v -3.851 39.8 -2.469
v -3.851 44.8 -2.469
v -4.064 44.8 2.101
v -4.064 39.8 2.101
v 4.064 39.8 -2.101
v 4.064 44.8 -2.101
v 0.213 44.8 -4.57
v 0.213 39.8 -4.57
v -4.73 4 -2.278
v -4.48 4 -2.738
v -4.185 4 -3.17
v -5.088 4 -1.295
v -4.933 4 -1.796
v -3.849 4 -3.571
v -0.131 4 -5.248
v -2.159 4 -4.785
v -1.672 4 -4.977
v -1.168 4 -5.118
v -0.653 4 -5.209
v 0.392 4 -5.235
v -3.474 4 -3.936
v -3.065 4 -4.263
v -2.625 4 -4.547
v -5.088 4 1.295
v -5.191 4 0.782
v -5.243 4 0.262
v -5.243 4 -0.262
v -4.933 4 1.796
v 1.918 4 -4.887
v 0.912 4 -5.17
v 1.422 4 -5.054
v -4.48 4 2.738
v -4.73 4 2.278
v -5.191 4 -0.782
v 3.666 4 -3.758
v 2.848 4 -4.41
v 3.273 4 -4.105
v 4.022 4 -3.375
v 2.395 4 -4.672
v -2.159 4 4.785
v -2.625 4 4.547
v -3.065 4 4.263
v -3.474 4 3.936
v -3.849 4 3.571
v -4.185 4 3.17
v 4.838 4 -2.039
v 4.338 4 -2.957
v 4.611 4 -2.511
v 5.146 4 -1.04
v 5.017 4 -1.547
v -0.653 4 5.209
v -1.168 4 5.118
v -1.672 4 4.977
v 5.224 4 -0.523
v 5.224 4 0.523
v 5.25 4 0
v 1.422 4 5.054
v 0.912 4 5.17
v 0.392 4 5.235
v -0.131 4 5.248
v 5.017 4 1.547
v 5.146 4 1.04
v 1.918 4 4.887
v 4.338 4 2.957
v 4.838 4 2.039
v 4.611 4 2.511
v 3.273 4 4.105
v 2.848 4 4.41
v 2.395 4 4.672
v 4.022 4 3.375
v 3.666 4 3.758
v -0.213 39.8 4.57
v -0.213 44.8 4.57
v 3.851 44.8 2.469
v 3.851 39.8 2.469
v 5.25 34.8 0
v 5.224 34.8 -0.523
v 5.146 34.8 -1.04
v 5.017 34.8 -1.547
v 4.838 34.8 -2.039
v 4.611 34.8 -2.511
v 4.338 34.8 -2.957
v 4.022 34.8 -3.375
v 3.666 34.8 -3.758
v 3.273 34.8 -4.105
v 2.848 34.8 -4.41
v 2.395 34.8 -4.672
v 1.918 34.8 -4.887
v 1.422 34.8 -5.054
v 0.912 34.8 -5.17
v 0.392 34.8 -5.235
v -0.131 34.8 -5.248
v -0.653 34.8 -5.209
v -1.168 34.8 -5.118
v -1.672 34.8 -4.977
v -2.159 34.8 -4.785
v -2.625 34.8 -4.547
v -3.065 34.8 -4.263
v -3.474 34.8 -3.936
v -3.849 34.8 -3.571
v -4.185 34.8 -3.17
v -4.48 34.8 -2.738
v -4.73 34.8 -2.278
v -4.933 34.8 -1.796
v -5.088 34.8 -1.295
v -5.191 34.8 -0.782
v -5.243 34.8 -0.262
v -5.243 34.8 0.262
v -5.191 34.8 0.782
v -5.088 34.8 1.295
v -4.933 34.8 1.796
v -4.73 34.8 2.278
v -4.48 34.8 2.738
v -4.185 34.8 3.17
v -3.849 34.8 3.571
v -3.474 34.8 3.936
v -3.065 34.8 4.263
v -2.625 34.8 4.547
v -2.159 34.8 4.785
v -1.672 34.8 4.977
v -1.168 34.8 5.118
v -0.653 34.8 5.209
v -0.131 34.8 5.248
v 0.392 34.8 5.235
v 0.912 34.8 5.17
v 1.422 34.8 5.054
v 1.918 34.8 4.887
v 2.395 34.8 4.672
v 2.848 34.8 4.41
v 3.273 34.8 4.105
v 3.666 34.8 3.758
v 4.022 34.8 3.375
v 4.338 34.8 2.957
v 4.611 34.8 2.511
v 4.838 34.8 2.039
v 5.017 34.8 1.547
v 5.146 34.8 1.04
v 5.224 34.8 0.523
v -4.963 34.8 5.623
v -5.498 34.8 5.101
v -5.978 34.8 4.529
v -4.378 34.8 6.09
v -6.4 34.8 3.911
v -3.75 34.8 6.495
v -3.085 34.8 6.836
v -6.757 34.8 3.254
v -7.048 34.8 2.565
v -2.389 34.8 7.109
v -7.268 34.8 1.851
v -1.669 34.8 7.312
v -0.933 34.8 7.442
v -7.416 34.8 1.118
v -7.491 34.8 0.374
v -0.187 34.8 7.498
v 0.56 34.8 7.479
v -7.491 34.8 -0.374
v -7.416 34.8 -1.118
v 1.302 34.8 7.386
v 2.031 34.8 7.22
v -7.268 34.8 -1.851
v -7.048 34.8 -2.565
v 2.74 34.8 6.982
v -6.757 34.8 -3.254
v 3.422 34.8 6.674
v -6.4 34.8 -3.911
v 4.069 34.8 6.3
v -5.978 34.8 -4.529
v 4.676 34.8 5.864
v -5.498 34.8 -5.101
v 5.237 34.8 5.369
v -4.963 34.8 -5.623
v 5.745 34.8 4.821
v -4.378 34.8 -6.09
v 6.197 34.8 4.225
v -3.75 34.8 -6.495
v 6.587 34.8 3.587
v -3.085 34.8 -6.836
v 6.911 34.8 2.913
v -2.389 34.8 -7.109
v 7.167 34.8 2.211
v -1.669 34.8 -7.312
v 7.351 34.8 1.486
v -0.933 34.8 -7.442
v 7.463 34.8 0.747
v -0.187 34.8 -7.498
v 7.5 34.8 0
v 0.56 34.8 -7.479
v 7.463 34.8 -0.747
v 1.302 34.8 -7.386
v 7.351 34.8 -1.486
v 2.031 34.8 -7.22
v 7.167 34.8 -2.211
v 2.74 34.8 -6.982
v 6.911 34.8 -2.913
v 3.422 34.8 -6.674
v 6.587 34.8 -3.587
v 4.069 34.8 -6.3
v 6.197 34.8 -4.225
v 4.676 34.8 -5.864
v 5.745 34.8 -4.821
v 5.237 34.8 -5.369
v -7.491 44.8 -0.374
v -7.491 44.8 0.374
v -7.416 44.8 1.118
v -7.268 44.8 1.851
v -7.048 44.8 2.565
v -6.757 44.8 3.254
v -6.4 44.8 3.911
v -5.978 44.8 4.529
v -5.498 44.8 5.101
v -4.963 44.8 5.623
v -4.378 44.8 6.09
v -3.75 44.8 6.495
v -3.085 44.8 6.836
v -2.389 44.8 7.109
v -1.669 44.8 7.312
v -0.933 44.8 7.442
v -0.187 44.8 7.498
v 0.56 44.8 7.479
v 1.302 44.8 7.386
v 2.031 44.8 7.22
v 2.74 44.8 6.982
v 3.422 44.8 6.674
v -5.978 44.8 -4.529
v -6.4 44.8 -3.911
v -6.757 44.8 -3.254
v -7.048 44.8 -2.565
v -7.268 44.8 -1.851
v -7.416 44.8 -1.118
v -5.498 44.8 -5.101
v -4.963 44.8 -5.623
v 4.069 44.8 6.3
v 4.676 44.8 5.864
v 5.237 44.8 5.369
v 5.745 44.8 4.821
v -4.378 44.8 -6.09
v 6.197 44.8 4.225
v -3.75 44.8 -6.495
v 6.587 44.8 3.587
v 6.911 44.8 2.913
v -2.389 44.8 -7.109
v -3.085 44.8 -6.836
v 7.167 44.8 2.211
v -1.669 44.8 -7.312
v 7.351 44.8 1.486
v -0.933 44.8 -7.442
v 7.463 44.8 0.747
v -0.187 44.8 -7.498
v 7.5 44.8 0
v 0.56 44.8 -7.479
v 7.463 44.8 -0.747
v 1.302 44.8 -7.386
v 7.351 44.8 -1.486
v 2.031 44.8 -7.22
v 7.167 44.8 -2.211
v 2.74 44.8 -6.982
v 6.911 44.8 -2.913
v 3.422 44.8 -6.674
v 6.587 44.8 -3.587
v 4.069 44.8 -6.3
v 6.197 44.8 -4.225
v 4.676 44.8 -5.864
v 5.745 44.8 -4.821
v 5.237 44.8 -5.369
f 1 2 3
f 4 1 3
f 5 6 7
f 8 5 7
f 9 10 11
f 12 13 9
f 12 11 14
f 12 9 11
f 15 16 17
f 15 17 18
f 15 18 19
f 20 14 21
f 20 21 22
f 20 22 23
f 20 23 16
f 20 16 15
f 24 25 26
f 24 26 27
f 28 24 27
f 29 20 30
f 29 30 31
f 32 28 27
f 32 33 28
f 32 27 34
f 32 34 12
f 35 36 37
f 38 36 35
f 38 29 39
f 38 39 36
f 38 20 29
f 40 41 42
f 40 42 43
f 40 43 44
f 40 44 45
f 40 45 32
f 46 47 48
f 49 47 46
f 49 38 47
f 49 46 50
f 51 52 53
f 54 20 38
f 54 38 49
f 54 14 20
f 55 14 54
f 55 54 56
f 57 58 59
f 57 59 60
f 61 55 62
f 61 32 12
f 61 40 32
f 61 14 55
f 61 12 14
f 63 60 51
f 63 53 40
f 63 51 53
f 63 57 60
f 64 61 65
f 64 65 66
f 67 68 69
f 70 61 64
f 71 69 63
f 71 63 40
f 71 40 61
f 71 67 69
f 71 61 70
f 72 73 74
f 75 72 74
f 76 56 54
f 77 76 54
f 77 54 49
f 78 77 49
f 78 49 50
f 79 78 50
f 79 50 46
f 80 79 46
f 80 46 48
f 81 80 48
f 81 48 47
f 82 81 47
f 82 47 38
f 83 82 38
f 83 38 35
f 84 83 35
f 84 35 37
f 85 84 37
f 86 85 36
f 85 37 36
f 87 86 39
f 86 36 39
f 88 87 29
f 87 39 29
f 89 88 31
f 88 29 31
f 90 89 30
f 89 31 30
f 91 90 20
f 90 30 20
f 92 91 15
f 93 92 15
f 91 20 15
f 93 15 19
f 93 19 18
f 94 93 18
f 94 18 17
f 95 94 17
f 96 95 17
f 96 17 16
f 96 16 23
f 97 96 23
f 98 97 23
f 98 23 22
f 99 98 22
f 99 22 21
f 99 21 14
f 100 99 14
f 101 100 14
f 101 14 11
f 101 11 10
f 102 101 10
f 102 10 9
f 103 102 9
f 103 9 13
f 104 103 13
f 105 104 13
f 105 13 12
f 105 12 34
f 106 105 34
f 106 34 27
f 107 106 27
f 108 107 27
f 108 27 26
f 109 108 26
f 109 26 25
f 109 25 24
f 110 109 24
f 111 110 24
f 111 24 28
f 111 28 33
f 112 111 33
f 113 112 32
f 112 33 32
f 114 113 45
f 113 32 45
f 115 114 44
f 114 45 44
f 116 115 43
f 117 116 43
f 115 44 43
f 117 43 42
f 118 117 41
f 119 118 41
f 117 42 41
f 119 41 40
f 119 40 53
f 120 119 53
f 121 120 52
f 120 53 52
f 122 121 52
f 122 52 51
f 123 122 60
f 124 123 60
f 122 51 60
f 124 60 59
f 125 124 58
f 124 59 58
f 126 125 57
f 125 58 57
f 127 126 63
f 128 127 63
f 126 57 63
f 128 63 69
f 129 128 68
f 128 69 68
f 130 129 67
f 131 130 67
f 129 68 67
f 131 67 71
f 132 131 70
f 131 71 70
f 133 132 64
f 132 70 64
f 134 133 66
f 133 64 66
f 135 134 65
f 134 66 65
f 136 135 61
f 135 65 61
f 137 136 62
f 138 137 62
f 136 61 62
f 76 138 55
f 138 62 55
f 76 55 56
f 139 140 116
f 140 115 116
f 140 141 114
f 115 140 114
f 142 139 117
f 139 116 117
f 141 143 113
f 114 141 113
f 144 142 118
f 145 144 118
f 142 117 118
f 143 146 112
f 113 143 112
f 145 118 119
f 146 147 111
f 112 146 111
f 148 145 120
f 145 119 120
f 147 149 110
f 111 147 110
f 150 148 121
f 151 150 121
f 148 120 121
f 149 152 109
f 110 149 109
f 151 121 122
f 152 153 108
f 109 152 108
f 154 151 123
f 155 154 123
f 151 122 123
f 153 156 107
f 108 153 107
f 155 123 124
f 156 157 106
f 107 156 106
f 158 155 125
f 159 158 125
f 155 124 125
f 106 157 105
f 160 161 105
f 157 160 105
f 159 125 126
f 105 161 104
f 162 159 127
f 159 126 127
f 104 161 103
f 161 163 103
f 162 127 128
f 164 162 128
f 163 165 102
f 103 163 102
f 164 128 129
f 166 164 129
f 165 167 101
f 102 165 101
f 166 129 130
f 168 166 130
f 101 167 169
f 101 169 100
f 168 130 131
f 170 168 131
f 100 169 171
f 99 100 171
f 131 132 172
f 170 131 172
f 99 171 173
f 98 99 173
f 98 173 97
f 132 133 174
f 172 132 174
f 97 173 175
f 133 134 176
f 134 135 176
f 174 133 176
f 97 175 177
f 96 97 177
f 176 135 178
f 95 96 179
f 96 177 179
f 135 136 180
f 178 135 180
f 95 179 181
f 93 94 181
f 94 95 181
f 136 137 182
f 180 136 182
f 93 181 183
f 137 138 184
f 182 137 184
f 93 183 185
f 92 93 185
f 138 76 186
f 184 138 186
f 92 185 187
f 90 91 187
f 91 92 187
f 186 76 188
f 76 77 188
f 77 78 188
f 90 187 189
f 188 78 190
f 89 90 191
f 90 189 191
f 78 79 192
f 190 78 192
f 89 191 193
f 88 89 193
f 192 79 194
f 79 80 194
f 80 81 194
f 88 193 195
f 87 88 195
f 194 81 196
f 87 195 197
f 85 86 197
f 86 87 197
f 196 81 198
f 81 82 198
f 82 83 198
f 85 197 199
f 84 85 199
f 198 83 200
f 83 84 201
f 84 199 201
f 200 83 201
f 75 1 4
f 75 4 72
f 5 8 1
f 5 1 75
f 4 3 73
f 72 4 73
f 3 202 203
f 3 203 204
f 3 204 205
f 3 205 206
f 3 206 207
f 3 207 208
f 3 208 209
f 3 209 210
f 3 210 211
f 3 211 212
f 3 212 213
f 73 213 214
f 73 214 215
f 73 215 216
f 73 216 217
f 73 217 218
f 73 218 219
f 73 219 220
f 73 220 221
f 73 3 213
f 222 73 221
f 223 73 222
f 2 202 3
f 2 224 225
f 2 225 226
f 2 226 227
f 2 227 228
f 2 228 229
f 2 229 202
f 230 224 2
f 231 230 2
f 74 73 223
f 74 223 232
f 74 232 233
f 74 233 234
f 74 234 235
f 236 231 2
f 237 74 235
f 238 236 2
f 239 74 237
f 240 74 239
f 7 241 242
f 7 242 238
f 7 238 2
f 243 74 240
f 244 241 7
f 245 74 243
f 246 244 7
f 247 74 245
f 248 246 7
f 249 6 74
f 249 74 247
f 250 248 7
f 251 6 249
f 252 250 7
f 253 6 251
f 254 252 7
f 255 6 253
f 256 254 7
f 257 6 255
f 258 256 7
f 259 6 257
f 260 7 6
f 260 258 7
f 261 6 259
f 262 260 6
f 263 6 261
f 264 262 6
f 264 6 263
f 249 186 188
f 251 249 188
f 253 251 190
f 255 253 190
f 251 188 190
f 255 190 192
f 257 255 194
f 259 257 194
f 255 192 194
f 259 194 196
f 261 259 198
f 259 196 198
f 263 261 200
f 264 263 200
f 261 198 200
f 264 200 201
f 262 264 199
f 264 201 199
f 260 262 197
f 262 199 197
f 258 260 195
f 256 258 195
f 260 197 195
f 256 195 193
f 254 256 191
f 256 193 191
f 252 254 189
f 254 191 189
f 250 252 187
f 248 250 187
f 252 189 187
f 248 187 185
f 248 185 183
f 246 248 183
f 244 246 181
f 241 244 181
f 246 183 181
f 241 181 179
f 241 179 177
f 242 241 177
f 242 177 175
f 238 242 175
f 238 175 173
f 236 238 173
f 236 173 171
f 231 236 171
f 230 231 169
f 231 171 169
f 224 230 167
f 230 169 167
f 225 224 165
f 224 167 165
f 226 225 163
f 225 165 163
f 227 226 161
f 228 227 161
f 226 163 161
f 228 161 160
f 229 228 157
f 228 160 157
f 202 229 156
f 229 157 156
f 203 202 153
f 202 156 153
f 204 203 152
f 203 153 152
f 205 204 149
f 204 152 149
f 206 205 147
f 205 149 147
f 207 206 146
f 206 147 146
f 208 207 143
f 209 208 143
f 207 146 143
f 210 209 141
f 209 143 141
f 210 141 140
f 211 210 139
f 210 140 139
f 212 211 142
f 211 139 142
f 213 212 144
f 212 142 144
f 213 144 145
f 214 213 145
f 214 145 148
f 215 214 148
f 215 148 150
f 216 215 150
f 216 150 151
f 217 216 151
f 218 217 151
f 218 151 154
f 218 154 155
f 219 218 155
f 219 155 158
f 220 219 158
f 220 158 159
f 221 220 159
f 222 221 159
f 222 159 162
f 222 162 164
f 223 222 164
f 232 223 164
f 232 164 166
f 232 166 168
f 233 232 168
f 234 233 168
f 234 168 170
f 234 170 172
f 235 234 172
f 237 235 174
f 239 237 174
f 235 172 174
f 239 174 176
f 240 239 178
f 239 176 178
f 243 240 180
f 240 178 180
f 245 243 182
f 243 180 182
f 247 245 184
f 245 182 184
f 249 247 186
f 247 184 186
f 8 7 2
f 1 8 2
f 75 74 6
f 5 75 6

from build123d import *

# Parameters (mm, degrees)
ESBO_O1_R                = 5.25
RESSALTO_EXTRUS_O1_DEPTH = 34.8
ESBO_O2_R                = 7.5
RESSALTO_EXTRUS_O2_DEPTH = 10
CORTE_EXTRUS_O1_DEPTH    = 5
ESBO_O4_R                = 5.25
CORTE_EXTRUS_O2_DEPTH    = 4


with BuildPart() as part:
    # Esboço1 → Ressalto-extrusão1 (new body)
    with BuildSketch(Plane(origin=(0, 0, 0), x_dir=(1, 0, 0), z_dir=(0, 1, 0))):
        Circle(ESBO_O1_R)
    extrude(amount=RESSALTO_EXTRUS_O1_DEPTH)

    # Esboço2 → Ressalto-extrusão2 (add)
    with BuildSketch(Plane(origin=(0, 34.8, 0), x_dir=(1, 0, 0), z_dir=(0, 1, 0))):
        Circle(ESBO_O2_R)
    extrude(amount=RESSALTO_EXTRUS_O2_DEPTH)

    # Esboço3 → Corte-extrusão1 (cut)
    with BuildSketch(Plane(origin=(0, 44.8, 0), x_dir=(1, 0, 0), z_dir=(0, 1, 0))):
        Polygon((0.212546418, 4.56974799), (-3.851244639, 2.468944592), (-4.063791057, -2.100803397), (-0.212546418, -4.56974799), (3.851244639, -2.468944592), (4.063791057, 2.100803397), align=None)
    extrude(amount=-CORTE_EXTRUS_O1_DEPTH, mode=Mode.SUBTRACT)

    # Esboço4 → Corte-extrusão2 (cut)
    with BuildSketch(Plane.XZ):
        Circle(ESBO_O4_R)
    extrude(amount=-CORTE_EXTRUS_O2_DEPTH, mode=Mode.SUBTRACT)


solid = part.part
